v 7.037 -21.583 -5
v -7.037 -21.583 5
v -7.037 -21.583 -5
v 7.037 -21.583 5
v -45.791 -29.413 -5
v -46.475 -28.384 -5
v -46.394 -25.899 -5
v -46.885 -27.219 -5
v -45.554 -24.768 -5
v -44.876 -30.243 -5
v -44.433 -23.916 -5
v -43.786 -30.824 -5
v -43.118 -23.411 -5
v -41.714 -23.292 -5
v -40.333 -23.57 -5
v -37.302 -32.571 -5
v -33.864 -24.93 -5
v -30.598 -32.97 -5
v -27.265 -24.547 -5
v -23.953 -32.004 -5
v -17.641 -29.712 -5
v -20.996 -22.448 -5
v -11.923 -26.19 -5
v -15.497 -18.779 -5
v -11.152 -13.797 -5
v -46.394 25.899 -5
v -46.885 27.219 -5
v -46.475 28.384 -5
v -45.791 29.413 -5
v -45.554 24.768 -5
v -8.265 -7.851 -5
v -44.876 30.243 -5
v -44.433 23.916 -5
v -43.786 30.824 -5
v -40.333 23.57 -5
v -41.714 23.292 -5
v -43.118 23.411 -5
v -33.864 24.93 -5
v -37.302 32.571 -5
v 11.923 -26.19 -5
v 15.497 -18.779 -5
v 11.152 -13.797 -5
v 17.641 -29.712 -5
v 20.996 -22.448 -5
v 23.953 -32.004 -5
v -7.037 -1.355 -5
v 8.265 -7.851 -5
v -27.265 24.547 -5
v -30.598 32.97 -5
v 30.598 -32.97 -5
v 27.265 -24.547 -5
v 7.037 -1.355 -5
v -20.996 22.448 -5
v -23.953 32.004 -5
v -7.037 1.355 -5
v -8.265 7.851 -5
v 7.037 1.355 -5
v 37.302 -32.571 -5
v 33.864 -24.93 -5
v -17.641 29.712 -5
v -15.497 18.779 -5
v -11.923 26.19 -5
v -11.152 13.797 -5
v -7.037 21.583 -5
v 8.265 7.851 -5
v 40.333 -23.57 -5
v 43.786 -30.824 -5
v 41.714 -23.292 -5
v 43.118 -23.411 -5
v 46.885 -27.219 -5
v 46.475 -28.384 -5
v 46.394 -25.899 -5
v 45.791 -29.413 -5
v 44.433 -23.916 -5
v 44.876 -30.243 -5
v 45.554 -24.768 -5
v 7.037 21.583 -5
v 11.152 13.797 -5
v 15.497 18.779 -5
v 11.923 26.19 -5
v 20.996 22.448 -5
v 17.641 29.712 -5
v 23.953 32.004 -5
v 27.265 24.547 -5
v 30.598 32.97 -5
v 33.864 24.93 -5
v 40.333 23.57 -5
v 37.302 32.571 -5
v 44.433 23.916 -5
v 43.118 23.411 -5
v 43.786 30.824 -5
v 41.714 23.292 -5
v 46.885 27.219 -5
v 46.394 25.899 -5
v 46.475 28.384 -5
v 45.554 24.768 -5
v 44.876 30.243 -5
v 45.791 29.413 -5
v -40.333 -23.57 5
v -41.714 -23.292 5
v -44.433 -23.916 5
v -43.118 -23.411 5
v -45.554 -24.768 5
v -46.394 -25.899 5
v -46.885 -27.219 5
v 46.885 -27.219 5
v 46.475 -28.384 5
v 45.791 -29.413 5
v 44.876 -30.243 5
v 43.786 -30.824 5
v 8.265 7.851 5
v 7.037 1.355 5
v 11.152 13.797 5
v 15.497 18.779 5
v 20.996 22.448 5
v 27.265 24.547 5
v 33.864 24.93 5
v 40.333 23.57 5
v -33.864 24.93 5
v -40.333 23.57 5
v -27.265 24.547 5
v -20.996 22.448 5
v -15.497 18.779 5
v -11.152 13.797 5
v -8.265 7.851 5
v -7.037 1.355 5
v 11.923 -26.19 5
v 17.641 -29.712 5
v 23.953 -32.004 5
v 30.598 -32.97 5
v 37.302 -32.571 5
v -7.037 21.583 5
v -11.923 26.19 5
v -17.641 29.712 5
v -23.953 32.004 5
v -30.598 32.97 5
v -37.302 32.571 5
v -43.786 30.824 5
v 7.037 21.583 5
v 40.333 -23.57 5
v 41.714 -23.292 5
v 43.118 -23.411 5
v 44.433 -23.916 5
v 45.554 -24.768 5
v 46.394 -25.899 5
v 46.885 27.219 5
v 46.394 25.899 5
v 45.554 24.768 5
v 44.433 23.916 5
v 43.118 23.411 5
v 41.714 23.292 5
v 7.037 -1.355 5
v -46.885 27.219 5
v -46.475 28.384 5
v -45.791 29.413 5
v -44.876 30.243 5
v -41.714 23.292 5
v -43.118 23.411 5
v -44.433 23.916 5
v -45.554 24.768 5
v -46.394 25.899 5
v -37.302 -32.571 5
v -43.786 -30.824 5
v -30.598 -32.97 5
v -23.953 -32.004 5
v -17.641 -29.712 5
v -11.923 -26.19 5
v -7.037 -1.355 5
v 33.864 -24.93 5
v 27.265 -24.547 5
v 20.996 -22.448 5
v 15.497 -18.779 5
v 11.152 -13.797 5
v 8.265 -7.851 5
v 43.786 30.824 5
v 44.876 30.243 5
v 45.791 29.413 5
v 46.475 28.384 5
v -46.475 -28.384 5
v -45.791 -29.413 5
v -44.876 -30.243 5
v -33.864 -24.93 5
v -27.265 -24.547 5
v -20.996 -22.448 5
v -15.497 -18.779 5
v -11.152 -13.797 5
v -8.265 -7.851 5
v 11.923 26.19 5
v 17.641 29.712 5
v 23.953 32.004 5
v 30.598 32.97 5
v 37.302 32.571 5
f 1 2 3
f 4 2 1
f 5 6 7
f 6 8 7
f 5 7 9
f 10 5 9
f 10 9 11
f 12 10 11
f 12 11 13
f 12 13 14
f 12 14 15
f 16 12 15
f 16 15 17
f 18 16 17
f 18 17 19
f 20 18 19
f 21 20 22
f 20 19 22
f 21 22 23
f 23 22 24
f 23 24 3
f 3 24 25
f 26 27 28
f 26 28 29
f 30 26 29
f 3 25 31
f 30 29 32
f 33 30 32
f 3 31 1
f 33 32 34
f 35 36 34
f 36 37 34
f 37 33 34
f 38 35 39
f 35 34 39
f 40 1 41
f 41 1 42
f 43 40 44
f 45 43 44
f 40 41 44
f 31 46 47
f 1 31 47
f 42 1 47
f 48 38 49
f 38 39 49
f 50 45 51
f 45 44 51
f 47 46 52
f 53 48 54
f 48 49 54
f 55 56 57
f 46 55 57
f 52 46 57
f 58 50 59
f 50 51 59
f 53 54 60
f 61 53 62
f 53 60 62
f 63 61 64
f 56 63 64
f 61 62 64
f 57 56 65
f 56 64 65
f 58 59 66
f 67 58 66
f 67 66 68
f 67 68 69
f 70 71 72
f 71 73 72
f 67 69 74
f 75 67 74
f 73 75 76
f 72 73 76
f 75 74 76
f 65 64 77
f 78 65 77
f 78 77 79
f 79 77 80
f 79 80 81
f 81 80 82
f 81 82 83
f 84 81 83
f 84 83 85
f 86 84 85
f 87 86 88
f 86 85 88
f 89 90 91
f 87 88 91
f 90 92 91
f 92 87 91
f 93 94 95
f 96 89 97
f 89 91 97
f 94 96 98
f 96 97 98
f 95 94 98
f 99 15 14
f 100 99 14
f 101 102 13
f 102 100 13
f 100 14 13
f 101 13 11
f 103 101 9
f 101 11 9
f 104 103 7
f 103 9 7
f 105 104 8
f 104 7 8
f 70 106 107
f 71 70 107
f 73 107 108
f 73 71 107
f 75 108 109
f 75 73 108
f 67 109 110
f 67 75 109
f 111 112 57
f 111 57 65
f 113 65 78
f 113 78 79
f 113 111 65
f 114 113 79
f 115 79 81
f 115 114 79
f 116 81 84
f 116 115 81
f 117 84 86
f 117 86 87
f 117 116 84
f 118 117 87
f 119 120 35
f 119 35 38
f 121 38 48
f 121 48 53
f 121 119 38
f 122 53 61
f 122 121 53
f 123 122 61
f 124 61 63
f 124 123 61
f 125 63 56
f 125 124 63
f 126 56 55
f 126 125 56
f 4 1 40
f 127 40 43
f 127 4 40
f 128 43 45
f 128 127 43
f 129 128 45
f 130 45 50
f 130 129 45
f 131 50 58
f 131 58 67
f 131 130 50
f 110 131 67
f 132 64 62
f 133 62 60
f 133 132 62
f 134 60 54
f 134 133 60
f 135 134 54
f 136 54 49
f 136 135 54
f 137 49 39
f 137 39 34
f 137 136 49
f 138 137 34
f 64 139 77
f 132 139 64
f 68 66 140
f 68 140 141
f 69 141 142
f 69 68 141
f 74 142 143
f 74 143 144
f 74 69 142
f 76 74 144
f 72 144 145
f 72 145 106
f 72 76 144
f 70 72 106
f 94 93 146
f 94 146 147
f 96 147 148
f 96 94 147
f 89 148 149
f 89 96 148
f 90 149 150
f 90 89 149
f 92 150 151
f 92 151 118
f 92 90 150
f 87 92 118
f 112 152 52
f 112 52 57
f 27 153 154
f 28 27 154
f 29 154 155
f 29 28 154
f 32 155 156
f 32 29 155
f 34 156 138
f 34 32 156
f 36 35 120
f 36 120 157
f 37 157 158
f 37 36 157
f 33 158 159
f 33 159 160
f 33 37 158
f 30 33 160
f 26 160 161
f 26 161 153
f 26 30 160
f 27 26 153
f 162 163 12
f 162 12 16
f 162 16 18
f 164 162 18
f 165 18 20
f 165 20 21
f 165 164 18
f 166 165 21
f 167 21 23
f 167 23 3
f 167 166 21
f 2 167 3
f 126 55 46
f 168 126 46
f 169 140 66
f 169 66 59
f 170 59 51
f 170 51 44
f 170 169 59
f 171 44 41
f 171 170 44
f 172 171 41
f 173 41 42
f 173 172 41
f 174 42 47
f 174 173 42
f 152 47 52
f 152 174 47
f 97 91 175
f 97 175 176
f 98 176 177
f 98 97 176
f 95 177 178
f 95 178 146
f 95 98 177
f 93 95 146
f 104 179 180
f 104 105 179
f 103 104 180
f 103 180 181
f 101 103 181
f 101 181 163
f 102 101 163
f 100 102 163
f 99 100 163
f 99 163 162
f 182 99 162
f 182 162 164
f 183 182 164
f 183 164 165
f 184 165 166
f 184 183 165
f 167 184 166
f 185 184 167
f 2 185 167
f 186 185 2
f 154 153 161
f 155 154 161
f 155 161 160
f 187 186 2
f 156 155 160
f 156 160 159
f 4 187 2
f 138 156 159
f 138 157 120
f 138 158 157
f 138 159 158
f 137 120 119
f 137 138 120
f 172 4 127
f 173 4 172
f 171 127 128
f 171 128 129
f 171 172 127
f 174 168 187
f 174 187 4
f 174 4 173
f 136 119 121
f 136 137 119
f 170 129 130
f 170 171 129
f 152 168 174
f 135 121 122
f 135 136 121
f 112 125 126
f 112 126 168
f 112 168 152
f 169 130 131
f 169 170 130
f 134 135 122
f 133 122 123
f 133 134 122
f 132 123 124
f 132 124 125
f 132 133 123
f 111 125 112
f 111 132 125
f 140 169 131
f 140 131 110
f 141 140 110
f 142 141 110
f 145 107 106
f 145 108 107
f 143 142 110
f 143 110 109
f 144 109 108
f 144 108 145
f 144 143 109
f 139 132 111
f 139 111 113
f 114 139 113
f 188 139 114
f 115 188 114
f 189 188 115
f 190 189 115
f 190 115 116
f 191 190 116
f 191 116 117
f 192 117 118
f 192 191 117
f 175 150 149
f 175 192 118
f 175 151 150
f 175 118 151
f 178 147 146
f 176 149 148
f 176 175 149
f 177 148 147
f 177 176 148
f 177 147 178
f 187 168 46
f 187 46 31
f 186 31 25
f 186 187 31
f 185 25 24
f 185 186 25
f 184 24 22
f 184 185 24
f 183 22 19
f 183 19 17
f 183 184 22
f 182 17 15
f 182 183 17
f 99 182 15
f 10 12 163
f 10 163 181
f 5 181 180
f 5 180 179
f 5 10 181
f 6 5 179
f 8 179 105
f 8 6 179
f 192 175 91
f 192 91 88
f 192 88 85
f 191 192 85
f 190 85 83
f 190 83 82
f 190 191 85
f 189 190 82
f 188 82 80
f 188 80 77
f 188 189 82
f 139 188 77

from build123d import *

# Parameters (mm, degrees)
F1_DEPTH      = 5
F1_DEPTH_BACK = 5
F2_T1_DEPTH   = 51.4213562373
F2_T3_DEPTH   = 27.589671948


# Not quite as in the source:
# - a fillet or chamfer that OpenCascade refuses, or shapes differently, is made with other operations: its cross-section is extruded or revolved along the edge and cut away or added


with BuildPart() as f1:
    # F0 (on Top) → F1 (new body, two sides)
    with BuildSketch(Plane.XY) as f1_sk:
        with BuildLine():
            ThreePointArc((-7.0367619663, -1.3552663468), (-21.4300874517, -22.6556162733), (-47, -20))
            Line((-47, -20), (-47, -29.3938769134))
            ThreePointArc((-47, -29.3938769134), (-25.6700714676, -32.3872197753), (-7.0367619663, -21.5832515361))
            Line((-7.0367619663, -21.5832515361), (-7.0367619663, -1.3552663468))
        make_face()
        with BuildLine():
            Line((-7.0367619663, 1.3552663468), (-7.0367619663, -1.3552663468))
            ThreePointArc((-7.0367619663, -1.3552663468), (-7, 0), (-7.0367619663, 1.3552663468))
        make_face()
        with BuildLine():
            ThreePointArc((-7.0367619663, 1.3552663468), (-7, 0), (-7.0367619663, -1.3552663468))
            Line((-7.0367619663, -1.3552663468), (-7.0367619663, -21.5832515361))
            ThreePointArc((-7.0367619663, -21.5832515361), (-2.7270271398, -15.2346007472), (0, -8.0622577483))
            ThreePointArc((0, -8.0622577483), (-1, 0), (0, 8.0622577483))
            ThreePointArc((0, 8.0622577483), (-2.7270271398, 15.2346007472), (-7.0367619663, 21.5832515361))
            Line((-7.0367619663, 21.5832515361), (-7.0367619663, 1.3552663468))
        make_face()
        with BuildLine():
            ThreePointArc((-47, 20), (-21.4300874517, 22.6556162733), (-7.0367619663, 1.3552663468))
            Line((-7.0367619663, 1.3552663468), (-7.0367619663, 21.5832515361))
            ThreePointArc((-7.0367619663, 21.5832515361), (-25.6700714676, 32.3872197753), (-47, 29.3938769134))
            Line((-47, 29.3938769134), (-47, 20))
        make_face()
        with BuildLine():
            ThreePointArc((0, -8.0622577483), (-2.7270271398, -15.2346007472), (-7.0367619663, -21.5832515361))
            Line((-7.0367619663, -21.5832515361), (7.0367619663, -21.5832515361))
            ThreePointArc((7.0367619663, -21.5832515361), (2.7270271398, -15.2346007472), (0, -8.0622577483))
        make_face()
        with BuildLine():
            Line((7.0367619663, 21.5832515361), (-7.0367619663, 21.5832515361))
            ThreePointArc((-7.0367619663, 21.5832515361), (-2.7270271398, 15.2346007472), (0, 8.0622577483))
            ThreePointArc((0, 8.0622577483), (2.7270271398, 15.2346007472), (7.0367619663, 21.5832515361))
        make_face()
        with BuildLine():
            ThreePointArc((0, 8.0622577483), (1, 0), (0, -8.0622577483))
            ThreePointArc((0, -8.0622577483), (2.7270271398, -15.2346007472), (7.0367619663, -21.5832515361))
            Line((7.0367619663, -21.5832515361), (7.0367619663, -1.3552663468))
            ThreePointArc((7.0367619663, -1.3552663468), (7, 0), (7.0367619663, 1.3552663468))
            Line((7.0367619663, 1.3552663468), (7.0367619663, 21.5832515361))
            ThreePointArc((7.0367619663, 21.5832515361), (2.7270271398, 15.2346007472), (0, 8.0622577483))
        make_face()
        with BuildLine():
            Line((7.0367619663, -1.3552663468), (7.0367619663, -21.5832515361))
            ThreePointArc((7.0367619663, -21.5832515361), (25.6700714676, -32.3872197753), (47, -29.3938769134))
            Line((47, -29.3938769134), (47, -20))
            ThreePointArc((47, -20), (21.4300874517, -22.6556162733), (7.0367619663, -1.3552663468))
        make_face()
        with BuildLine():
            ThreePointArc((47, 29.3938769134), (25.6700714676, 32.3872197753), (7.0367619663, 21.5832515361))
            Line((7.0367619663, 21.5832515361), (7.0367619663, 1.3552663468))
            ThreePointArc((7.0367619663, 1.3552663468), (21.4300874517, 22.6556162733), (47, 20))
            Line((47, 20), (47, 29.3938769134))
        make_face()
        with BuildLine():
            ThreePointArc((7.0367619663, 1.3552663468), (7, 0), (7.0367619663, -1.3552663468))
            Line((7.0367619663, -1.3552663468), (7.0367619663, 1.3552663468))
        make_face()
        with BuildLine():
            ThreePointArc((0, 8.0622577483), (-1, 0), (0, -8.0622577483))
            ThreePointArc((0, -8.0622577483), (1, 0), (0, 8.0622577483))
        make_face()
    extrude(amount=F1_DEPTH)
    extrude(f1_sk.sketch, amount=-F1_DEPTH_BACK)

    # F2: fillet of radius 5 on 8 edges, made by hand

    # F2_s2 → F2_t1 (cut)
    with BuildSketch(Plane.XY.offset(-25.7106781187)):
        with BuildLine():
            ThreePointArc((-40.3333333333, 23.5702260396), (-44.8867513459, 24.2017883428), (-47, 28.2842712475))
            Line((-47, 28.2842712475), (-47, 20))
            ThreePointArc((-47, 20), (-43.8024463398, 22.0386537791), (-40.3333333333, 23.5702260396))
        make_face()
        with BuildLine():
            ThreePointArc((-40.3333333333, -23.5702260396), (-44.8867513459, -24.2017883428), (-47, -28.2842712475))
            Line((-47, -28.2842712475), (-47, -20))
            ThreePointArc((-47, -20), (-43.8024463398, -22.0386537791), (-40.3333333333, -23.5702260396))
        make_face()
        with BuildLine():
            ThreePointArc((40.3333333333, -23.5702260396), (44.8867513459, -24.2017883428), (47, -28.2842712475))
            Line((47, -28.2842712475), (47, -20))
            ThreePointArc((47, -20), (43.8024463398, -22.0386537791), (40.3333333333, -23.5702260396))
        make_face()
        with BuildLine():
            ThreePointArc((47, 28.2842712475), (44.8867513459, 24.2017883428), (40.3333333333, 23.5702260396))
            ThreePointArc((40.3333333333, 23.5702260396), (43.8024463398, 22.0386537791), (47, 20))
            Line((47, 20), (47, 28.2842712475))
        make_face()
    extrude(amount=F2_T1_DEPTH, mode=Mode.SUBTRACT)

    # F2_s4 → F2_t3 (cut)
    with BuildSketch(Plane.XY.offset(-13.794835974)):
        with BuildLine():
            ThreePointArc((-43.7857142857, -30.8236425293), (-46.1187723552, -28.9881272088), (-47, -26.1533936612))
            Line((-47, -26.1533936612), (-47, -29.3938769134))
            ThreePointArc((-47, -29.3938769134), (-45.4119230492, -30.1516221806), (-43.7857142857, -30.8236425293))
        make_face()
        with BuildLine():
            ThreePointArc((-47, 26.1533936612), (-46.1187723552, 28.9881272088), (-43.7857142857, 30.8236425293))
            ThreePointArc((-43.7857142857, 30.8236425293), (-45.4119230492, 30.1516221806), (-47, 29.3938769134))
            Line((-47, 29.3938769134), (-47, 26.1533936612))
        make_face()
        with BuildLine():
            ThreePointArc((47, -26.1533936612), (46.1187723552, -28.9881272088), (43.7857142857, -30.8236425293))
            ThreePointArc((43.7857142857, -30.8236425293), (45.4119230492, -30.1516221806), (47, -29.3938769134))
            Line((47, -29.3938769134), (47, -26.1533936612))
        make_face()
        with BuildLine():
            ThreePointArc((43.7857142857, 30.8236425293), (46.1187723552, 28.9881272088), (47, 26.1533936612))
            Line((47, 26.1533936612), (47, 29.3938769134))
            ThreePointArc((47, 29.3938769134), (45.4119230492, 30.1516221806), (43.7857142857, 30.8236425293))
        make_face()
    extrude(amount=F2_T3_DEPTH, mode=Mode.SUBTRACT)


solid = f1.part
